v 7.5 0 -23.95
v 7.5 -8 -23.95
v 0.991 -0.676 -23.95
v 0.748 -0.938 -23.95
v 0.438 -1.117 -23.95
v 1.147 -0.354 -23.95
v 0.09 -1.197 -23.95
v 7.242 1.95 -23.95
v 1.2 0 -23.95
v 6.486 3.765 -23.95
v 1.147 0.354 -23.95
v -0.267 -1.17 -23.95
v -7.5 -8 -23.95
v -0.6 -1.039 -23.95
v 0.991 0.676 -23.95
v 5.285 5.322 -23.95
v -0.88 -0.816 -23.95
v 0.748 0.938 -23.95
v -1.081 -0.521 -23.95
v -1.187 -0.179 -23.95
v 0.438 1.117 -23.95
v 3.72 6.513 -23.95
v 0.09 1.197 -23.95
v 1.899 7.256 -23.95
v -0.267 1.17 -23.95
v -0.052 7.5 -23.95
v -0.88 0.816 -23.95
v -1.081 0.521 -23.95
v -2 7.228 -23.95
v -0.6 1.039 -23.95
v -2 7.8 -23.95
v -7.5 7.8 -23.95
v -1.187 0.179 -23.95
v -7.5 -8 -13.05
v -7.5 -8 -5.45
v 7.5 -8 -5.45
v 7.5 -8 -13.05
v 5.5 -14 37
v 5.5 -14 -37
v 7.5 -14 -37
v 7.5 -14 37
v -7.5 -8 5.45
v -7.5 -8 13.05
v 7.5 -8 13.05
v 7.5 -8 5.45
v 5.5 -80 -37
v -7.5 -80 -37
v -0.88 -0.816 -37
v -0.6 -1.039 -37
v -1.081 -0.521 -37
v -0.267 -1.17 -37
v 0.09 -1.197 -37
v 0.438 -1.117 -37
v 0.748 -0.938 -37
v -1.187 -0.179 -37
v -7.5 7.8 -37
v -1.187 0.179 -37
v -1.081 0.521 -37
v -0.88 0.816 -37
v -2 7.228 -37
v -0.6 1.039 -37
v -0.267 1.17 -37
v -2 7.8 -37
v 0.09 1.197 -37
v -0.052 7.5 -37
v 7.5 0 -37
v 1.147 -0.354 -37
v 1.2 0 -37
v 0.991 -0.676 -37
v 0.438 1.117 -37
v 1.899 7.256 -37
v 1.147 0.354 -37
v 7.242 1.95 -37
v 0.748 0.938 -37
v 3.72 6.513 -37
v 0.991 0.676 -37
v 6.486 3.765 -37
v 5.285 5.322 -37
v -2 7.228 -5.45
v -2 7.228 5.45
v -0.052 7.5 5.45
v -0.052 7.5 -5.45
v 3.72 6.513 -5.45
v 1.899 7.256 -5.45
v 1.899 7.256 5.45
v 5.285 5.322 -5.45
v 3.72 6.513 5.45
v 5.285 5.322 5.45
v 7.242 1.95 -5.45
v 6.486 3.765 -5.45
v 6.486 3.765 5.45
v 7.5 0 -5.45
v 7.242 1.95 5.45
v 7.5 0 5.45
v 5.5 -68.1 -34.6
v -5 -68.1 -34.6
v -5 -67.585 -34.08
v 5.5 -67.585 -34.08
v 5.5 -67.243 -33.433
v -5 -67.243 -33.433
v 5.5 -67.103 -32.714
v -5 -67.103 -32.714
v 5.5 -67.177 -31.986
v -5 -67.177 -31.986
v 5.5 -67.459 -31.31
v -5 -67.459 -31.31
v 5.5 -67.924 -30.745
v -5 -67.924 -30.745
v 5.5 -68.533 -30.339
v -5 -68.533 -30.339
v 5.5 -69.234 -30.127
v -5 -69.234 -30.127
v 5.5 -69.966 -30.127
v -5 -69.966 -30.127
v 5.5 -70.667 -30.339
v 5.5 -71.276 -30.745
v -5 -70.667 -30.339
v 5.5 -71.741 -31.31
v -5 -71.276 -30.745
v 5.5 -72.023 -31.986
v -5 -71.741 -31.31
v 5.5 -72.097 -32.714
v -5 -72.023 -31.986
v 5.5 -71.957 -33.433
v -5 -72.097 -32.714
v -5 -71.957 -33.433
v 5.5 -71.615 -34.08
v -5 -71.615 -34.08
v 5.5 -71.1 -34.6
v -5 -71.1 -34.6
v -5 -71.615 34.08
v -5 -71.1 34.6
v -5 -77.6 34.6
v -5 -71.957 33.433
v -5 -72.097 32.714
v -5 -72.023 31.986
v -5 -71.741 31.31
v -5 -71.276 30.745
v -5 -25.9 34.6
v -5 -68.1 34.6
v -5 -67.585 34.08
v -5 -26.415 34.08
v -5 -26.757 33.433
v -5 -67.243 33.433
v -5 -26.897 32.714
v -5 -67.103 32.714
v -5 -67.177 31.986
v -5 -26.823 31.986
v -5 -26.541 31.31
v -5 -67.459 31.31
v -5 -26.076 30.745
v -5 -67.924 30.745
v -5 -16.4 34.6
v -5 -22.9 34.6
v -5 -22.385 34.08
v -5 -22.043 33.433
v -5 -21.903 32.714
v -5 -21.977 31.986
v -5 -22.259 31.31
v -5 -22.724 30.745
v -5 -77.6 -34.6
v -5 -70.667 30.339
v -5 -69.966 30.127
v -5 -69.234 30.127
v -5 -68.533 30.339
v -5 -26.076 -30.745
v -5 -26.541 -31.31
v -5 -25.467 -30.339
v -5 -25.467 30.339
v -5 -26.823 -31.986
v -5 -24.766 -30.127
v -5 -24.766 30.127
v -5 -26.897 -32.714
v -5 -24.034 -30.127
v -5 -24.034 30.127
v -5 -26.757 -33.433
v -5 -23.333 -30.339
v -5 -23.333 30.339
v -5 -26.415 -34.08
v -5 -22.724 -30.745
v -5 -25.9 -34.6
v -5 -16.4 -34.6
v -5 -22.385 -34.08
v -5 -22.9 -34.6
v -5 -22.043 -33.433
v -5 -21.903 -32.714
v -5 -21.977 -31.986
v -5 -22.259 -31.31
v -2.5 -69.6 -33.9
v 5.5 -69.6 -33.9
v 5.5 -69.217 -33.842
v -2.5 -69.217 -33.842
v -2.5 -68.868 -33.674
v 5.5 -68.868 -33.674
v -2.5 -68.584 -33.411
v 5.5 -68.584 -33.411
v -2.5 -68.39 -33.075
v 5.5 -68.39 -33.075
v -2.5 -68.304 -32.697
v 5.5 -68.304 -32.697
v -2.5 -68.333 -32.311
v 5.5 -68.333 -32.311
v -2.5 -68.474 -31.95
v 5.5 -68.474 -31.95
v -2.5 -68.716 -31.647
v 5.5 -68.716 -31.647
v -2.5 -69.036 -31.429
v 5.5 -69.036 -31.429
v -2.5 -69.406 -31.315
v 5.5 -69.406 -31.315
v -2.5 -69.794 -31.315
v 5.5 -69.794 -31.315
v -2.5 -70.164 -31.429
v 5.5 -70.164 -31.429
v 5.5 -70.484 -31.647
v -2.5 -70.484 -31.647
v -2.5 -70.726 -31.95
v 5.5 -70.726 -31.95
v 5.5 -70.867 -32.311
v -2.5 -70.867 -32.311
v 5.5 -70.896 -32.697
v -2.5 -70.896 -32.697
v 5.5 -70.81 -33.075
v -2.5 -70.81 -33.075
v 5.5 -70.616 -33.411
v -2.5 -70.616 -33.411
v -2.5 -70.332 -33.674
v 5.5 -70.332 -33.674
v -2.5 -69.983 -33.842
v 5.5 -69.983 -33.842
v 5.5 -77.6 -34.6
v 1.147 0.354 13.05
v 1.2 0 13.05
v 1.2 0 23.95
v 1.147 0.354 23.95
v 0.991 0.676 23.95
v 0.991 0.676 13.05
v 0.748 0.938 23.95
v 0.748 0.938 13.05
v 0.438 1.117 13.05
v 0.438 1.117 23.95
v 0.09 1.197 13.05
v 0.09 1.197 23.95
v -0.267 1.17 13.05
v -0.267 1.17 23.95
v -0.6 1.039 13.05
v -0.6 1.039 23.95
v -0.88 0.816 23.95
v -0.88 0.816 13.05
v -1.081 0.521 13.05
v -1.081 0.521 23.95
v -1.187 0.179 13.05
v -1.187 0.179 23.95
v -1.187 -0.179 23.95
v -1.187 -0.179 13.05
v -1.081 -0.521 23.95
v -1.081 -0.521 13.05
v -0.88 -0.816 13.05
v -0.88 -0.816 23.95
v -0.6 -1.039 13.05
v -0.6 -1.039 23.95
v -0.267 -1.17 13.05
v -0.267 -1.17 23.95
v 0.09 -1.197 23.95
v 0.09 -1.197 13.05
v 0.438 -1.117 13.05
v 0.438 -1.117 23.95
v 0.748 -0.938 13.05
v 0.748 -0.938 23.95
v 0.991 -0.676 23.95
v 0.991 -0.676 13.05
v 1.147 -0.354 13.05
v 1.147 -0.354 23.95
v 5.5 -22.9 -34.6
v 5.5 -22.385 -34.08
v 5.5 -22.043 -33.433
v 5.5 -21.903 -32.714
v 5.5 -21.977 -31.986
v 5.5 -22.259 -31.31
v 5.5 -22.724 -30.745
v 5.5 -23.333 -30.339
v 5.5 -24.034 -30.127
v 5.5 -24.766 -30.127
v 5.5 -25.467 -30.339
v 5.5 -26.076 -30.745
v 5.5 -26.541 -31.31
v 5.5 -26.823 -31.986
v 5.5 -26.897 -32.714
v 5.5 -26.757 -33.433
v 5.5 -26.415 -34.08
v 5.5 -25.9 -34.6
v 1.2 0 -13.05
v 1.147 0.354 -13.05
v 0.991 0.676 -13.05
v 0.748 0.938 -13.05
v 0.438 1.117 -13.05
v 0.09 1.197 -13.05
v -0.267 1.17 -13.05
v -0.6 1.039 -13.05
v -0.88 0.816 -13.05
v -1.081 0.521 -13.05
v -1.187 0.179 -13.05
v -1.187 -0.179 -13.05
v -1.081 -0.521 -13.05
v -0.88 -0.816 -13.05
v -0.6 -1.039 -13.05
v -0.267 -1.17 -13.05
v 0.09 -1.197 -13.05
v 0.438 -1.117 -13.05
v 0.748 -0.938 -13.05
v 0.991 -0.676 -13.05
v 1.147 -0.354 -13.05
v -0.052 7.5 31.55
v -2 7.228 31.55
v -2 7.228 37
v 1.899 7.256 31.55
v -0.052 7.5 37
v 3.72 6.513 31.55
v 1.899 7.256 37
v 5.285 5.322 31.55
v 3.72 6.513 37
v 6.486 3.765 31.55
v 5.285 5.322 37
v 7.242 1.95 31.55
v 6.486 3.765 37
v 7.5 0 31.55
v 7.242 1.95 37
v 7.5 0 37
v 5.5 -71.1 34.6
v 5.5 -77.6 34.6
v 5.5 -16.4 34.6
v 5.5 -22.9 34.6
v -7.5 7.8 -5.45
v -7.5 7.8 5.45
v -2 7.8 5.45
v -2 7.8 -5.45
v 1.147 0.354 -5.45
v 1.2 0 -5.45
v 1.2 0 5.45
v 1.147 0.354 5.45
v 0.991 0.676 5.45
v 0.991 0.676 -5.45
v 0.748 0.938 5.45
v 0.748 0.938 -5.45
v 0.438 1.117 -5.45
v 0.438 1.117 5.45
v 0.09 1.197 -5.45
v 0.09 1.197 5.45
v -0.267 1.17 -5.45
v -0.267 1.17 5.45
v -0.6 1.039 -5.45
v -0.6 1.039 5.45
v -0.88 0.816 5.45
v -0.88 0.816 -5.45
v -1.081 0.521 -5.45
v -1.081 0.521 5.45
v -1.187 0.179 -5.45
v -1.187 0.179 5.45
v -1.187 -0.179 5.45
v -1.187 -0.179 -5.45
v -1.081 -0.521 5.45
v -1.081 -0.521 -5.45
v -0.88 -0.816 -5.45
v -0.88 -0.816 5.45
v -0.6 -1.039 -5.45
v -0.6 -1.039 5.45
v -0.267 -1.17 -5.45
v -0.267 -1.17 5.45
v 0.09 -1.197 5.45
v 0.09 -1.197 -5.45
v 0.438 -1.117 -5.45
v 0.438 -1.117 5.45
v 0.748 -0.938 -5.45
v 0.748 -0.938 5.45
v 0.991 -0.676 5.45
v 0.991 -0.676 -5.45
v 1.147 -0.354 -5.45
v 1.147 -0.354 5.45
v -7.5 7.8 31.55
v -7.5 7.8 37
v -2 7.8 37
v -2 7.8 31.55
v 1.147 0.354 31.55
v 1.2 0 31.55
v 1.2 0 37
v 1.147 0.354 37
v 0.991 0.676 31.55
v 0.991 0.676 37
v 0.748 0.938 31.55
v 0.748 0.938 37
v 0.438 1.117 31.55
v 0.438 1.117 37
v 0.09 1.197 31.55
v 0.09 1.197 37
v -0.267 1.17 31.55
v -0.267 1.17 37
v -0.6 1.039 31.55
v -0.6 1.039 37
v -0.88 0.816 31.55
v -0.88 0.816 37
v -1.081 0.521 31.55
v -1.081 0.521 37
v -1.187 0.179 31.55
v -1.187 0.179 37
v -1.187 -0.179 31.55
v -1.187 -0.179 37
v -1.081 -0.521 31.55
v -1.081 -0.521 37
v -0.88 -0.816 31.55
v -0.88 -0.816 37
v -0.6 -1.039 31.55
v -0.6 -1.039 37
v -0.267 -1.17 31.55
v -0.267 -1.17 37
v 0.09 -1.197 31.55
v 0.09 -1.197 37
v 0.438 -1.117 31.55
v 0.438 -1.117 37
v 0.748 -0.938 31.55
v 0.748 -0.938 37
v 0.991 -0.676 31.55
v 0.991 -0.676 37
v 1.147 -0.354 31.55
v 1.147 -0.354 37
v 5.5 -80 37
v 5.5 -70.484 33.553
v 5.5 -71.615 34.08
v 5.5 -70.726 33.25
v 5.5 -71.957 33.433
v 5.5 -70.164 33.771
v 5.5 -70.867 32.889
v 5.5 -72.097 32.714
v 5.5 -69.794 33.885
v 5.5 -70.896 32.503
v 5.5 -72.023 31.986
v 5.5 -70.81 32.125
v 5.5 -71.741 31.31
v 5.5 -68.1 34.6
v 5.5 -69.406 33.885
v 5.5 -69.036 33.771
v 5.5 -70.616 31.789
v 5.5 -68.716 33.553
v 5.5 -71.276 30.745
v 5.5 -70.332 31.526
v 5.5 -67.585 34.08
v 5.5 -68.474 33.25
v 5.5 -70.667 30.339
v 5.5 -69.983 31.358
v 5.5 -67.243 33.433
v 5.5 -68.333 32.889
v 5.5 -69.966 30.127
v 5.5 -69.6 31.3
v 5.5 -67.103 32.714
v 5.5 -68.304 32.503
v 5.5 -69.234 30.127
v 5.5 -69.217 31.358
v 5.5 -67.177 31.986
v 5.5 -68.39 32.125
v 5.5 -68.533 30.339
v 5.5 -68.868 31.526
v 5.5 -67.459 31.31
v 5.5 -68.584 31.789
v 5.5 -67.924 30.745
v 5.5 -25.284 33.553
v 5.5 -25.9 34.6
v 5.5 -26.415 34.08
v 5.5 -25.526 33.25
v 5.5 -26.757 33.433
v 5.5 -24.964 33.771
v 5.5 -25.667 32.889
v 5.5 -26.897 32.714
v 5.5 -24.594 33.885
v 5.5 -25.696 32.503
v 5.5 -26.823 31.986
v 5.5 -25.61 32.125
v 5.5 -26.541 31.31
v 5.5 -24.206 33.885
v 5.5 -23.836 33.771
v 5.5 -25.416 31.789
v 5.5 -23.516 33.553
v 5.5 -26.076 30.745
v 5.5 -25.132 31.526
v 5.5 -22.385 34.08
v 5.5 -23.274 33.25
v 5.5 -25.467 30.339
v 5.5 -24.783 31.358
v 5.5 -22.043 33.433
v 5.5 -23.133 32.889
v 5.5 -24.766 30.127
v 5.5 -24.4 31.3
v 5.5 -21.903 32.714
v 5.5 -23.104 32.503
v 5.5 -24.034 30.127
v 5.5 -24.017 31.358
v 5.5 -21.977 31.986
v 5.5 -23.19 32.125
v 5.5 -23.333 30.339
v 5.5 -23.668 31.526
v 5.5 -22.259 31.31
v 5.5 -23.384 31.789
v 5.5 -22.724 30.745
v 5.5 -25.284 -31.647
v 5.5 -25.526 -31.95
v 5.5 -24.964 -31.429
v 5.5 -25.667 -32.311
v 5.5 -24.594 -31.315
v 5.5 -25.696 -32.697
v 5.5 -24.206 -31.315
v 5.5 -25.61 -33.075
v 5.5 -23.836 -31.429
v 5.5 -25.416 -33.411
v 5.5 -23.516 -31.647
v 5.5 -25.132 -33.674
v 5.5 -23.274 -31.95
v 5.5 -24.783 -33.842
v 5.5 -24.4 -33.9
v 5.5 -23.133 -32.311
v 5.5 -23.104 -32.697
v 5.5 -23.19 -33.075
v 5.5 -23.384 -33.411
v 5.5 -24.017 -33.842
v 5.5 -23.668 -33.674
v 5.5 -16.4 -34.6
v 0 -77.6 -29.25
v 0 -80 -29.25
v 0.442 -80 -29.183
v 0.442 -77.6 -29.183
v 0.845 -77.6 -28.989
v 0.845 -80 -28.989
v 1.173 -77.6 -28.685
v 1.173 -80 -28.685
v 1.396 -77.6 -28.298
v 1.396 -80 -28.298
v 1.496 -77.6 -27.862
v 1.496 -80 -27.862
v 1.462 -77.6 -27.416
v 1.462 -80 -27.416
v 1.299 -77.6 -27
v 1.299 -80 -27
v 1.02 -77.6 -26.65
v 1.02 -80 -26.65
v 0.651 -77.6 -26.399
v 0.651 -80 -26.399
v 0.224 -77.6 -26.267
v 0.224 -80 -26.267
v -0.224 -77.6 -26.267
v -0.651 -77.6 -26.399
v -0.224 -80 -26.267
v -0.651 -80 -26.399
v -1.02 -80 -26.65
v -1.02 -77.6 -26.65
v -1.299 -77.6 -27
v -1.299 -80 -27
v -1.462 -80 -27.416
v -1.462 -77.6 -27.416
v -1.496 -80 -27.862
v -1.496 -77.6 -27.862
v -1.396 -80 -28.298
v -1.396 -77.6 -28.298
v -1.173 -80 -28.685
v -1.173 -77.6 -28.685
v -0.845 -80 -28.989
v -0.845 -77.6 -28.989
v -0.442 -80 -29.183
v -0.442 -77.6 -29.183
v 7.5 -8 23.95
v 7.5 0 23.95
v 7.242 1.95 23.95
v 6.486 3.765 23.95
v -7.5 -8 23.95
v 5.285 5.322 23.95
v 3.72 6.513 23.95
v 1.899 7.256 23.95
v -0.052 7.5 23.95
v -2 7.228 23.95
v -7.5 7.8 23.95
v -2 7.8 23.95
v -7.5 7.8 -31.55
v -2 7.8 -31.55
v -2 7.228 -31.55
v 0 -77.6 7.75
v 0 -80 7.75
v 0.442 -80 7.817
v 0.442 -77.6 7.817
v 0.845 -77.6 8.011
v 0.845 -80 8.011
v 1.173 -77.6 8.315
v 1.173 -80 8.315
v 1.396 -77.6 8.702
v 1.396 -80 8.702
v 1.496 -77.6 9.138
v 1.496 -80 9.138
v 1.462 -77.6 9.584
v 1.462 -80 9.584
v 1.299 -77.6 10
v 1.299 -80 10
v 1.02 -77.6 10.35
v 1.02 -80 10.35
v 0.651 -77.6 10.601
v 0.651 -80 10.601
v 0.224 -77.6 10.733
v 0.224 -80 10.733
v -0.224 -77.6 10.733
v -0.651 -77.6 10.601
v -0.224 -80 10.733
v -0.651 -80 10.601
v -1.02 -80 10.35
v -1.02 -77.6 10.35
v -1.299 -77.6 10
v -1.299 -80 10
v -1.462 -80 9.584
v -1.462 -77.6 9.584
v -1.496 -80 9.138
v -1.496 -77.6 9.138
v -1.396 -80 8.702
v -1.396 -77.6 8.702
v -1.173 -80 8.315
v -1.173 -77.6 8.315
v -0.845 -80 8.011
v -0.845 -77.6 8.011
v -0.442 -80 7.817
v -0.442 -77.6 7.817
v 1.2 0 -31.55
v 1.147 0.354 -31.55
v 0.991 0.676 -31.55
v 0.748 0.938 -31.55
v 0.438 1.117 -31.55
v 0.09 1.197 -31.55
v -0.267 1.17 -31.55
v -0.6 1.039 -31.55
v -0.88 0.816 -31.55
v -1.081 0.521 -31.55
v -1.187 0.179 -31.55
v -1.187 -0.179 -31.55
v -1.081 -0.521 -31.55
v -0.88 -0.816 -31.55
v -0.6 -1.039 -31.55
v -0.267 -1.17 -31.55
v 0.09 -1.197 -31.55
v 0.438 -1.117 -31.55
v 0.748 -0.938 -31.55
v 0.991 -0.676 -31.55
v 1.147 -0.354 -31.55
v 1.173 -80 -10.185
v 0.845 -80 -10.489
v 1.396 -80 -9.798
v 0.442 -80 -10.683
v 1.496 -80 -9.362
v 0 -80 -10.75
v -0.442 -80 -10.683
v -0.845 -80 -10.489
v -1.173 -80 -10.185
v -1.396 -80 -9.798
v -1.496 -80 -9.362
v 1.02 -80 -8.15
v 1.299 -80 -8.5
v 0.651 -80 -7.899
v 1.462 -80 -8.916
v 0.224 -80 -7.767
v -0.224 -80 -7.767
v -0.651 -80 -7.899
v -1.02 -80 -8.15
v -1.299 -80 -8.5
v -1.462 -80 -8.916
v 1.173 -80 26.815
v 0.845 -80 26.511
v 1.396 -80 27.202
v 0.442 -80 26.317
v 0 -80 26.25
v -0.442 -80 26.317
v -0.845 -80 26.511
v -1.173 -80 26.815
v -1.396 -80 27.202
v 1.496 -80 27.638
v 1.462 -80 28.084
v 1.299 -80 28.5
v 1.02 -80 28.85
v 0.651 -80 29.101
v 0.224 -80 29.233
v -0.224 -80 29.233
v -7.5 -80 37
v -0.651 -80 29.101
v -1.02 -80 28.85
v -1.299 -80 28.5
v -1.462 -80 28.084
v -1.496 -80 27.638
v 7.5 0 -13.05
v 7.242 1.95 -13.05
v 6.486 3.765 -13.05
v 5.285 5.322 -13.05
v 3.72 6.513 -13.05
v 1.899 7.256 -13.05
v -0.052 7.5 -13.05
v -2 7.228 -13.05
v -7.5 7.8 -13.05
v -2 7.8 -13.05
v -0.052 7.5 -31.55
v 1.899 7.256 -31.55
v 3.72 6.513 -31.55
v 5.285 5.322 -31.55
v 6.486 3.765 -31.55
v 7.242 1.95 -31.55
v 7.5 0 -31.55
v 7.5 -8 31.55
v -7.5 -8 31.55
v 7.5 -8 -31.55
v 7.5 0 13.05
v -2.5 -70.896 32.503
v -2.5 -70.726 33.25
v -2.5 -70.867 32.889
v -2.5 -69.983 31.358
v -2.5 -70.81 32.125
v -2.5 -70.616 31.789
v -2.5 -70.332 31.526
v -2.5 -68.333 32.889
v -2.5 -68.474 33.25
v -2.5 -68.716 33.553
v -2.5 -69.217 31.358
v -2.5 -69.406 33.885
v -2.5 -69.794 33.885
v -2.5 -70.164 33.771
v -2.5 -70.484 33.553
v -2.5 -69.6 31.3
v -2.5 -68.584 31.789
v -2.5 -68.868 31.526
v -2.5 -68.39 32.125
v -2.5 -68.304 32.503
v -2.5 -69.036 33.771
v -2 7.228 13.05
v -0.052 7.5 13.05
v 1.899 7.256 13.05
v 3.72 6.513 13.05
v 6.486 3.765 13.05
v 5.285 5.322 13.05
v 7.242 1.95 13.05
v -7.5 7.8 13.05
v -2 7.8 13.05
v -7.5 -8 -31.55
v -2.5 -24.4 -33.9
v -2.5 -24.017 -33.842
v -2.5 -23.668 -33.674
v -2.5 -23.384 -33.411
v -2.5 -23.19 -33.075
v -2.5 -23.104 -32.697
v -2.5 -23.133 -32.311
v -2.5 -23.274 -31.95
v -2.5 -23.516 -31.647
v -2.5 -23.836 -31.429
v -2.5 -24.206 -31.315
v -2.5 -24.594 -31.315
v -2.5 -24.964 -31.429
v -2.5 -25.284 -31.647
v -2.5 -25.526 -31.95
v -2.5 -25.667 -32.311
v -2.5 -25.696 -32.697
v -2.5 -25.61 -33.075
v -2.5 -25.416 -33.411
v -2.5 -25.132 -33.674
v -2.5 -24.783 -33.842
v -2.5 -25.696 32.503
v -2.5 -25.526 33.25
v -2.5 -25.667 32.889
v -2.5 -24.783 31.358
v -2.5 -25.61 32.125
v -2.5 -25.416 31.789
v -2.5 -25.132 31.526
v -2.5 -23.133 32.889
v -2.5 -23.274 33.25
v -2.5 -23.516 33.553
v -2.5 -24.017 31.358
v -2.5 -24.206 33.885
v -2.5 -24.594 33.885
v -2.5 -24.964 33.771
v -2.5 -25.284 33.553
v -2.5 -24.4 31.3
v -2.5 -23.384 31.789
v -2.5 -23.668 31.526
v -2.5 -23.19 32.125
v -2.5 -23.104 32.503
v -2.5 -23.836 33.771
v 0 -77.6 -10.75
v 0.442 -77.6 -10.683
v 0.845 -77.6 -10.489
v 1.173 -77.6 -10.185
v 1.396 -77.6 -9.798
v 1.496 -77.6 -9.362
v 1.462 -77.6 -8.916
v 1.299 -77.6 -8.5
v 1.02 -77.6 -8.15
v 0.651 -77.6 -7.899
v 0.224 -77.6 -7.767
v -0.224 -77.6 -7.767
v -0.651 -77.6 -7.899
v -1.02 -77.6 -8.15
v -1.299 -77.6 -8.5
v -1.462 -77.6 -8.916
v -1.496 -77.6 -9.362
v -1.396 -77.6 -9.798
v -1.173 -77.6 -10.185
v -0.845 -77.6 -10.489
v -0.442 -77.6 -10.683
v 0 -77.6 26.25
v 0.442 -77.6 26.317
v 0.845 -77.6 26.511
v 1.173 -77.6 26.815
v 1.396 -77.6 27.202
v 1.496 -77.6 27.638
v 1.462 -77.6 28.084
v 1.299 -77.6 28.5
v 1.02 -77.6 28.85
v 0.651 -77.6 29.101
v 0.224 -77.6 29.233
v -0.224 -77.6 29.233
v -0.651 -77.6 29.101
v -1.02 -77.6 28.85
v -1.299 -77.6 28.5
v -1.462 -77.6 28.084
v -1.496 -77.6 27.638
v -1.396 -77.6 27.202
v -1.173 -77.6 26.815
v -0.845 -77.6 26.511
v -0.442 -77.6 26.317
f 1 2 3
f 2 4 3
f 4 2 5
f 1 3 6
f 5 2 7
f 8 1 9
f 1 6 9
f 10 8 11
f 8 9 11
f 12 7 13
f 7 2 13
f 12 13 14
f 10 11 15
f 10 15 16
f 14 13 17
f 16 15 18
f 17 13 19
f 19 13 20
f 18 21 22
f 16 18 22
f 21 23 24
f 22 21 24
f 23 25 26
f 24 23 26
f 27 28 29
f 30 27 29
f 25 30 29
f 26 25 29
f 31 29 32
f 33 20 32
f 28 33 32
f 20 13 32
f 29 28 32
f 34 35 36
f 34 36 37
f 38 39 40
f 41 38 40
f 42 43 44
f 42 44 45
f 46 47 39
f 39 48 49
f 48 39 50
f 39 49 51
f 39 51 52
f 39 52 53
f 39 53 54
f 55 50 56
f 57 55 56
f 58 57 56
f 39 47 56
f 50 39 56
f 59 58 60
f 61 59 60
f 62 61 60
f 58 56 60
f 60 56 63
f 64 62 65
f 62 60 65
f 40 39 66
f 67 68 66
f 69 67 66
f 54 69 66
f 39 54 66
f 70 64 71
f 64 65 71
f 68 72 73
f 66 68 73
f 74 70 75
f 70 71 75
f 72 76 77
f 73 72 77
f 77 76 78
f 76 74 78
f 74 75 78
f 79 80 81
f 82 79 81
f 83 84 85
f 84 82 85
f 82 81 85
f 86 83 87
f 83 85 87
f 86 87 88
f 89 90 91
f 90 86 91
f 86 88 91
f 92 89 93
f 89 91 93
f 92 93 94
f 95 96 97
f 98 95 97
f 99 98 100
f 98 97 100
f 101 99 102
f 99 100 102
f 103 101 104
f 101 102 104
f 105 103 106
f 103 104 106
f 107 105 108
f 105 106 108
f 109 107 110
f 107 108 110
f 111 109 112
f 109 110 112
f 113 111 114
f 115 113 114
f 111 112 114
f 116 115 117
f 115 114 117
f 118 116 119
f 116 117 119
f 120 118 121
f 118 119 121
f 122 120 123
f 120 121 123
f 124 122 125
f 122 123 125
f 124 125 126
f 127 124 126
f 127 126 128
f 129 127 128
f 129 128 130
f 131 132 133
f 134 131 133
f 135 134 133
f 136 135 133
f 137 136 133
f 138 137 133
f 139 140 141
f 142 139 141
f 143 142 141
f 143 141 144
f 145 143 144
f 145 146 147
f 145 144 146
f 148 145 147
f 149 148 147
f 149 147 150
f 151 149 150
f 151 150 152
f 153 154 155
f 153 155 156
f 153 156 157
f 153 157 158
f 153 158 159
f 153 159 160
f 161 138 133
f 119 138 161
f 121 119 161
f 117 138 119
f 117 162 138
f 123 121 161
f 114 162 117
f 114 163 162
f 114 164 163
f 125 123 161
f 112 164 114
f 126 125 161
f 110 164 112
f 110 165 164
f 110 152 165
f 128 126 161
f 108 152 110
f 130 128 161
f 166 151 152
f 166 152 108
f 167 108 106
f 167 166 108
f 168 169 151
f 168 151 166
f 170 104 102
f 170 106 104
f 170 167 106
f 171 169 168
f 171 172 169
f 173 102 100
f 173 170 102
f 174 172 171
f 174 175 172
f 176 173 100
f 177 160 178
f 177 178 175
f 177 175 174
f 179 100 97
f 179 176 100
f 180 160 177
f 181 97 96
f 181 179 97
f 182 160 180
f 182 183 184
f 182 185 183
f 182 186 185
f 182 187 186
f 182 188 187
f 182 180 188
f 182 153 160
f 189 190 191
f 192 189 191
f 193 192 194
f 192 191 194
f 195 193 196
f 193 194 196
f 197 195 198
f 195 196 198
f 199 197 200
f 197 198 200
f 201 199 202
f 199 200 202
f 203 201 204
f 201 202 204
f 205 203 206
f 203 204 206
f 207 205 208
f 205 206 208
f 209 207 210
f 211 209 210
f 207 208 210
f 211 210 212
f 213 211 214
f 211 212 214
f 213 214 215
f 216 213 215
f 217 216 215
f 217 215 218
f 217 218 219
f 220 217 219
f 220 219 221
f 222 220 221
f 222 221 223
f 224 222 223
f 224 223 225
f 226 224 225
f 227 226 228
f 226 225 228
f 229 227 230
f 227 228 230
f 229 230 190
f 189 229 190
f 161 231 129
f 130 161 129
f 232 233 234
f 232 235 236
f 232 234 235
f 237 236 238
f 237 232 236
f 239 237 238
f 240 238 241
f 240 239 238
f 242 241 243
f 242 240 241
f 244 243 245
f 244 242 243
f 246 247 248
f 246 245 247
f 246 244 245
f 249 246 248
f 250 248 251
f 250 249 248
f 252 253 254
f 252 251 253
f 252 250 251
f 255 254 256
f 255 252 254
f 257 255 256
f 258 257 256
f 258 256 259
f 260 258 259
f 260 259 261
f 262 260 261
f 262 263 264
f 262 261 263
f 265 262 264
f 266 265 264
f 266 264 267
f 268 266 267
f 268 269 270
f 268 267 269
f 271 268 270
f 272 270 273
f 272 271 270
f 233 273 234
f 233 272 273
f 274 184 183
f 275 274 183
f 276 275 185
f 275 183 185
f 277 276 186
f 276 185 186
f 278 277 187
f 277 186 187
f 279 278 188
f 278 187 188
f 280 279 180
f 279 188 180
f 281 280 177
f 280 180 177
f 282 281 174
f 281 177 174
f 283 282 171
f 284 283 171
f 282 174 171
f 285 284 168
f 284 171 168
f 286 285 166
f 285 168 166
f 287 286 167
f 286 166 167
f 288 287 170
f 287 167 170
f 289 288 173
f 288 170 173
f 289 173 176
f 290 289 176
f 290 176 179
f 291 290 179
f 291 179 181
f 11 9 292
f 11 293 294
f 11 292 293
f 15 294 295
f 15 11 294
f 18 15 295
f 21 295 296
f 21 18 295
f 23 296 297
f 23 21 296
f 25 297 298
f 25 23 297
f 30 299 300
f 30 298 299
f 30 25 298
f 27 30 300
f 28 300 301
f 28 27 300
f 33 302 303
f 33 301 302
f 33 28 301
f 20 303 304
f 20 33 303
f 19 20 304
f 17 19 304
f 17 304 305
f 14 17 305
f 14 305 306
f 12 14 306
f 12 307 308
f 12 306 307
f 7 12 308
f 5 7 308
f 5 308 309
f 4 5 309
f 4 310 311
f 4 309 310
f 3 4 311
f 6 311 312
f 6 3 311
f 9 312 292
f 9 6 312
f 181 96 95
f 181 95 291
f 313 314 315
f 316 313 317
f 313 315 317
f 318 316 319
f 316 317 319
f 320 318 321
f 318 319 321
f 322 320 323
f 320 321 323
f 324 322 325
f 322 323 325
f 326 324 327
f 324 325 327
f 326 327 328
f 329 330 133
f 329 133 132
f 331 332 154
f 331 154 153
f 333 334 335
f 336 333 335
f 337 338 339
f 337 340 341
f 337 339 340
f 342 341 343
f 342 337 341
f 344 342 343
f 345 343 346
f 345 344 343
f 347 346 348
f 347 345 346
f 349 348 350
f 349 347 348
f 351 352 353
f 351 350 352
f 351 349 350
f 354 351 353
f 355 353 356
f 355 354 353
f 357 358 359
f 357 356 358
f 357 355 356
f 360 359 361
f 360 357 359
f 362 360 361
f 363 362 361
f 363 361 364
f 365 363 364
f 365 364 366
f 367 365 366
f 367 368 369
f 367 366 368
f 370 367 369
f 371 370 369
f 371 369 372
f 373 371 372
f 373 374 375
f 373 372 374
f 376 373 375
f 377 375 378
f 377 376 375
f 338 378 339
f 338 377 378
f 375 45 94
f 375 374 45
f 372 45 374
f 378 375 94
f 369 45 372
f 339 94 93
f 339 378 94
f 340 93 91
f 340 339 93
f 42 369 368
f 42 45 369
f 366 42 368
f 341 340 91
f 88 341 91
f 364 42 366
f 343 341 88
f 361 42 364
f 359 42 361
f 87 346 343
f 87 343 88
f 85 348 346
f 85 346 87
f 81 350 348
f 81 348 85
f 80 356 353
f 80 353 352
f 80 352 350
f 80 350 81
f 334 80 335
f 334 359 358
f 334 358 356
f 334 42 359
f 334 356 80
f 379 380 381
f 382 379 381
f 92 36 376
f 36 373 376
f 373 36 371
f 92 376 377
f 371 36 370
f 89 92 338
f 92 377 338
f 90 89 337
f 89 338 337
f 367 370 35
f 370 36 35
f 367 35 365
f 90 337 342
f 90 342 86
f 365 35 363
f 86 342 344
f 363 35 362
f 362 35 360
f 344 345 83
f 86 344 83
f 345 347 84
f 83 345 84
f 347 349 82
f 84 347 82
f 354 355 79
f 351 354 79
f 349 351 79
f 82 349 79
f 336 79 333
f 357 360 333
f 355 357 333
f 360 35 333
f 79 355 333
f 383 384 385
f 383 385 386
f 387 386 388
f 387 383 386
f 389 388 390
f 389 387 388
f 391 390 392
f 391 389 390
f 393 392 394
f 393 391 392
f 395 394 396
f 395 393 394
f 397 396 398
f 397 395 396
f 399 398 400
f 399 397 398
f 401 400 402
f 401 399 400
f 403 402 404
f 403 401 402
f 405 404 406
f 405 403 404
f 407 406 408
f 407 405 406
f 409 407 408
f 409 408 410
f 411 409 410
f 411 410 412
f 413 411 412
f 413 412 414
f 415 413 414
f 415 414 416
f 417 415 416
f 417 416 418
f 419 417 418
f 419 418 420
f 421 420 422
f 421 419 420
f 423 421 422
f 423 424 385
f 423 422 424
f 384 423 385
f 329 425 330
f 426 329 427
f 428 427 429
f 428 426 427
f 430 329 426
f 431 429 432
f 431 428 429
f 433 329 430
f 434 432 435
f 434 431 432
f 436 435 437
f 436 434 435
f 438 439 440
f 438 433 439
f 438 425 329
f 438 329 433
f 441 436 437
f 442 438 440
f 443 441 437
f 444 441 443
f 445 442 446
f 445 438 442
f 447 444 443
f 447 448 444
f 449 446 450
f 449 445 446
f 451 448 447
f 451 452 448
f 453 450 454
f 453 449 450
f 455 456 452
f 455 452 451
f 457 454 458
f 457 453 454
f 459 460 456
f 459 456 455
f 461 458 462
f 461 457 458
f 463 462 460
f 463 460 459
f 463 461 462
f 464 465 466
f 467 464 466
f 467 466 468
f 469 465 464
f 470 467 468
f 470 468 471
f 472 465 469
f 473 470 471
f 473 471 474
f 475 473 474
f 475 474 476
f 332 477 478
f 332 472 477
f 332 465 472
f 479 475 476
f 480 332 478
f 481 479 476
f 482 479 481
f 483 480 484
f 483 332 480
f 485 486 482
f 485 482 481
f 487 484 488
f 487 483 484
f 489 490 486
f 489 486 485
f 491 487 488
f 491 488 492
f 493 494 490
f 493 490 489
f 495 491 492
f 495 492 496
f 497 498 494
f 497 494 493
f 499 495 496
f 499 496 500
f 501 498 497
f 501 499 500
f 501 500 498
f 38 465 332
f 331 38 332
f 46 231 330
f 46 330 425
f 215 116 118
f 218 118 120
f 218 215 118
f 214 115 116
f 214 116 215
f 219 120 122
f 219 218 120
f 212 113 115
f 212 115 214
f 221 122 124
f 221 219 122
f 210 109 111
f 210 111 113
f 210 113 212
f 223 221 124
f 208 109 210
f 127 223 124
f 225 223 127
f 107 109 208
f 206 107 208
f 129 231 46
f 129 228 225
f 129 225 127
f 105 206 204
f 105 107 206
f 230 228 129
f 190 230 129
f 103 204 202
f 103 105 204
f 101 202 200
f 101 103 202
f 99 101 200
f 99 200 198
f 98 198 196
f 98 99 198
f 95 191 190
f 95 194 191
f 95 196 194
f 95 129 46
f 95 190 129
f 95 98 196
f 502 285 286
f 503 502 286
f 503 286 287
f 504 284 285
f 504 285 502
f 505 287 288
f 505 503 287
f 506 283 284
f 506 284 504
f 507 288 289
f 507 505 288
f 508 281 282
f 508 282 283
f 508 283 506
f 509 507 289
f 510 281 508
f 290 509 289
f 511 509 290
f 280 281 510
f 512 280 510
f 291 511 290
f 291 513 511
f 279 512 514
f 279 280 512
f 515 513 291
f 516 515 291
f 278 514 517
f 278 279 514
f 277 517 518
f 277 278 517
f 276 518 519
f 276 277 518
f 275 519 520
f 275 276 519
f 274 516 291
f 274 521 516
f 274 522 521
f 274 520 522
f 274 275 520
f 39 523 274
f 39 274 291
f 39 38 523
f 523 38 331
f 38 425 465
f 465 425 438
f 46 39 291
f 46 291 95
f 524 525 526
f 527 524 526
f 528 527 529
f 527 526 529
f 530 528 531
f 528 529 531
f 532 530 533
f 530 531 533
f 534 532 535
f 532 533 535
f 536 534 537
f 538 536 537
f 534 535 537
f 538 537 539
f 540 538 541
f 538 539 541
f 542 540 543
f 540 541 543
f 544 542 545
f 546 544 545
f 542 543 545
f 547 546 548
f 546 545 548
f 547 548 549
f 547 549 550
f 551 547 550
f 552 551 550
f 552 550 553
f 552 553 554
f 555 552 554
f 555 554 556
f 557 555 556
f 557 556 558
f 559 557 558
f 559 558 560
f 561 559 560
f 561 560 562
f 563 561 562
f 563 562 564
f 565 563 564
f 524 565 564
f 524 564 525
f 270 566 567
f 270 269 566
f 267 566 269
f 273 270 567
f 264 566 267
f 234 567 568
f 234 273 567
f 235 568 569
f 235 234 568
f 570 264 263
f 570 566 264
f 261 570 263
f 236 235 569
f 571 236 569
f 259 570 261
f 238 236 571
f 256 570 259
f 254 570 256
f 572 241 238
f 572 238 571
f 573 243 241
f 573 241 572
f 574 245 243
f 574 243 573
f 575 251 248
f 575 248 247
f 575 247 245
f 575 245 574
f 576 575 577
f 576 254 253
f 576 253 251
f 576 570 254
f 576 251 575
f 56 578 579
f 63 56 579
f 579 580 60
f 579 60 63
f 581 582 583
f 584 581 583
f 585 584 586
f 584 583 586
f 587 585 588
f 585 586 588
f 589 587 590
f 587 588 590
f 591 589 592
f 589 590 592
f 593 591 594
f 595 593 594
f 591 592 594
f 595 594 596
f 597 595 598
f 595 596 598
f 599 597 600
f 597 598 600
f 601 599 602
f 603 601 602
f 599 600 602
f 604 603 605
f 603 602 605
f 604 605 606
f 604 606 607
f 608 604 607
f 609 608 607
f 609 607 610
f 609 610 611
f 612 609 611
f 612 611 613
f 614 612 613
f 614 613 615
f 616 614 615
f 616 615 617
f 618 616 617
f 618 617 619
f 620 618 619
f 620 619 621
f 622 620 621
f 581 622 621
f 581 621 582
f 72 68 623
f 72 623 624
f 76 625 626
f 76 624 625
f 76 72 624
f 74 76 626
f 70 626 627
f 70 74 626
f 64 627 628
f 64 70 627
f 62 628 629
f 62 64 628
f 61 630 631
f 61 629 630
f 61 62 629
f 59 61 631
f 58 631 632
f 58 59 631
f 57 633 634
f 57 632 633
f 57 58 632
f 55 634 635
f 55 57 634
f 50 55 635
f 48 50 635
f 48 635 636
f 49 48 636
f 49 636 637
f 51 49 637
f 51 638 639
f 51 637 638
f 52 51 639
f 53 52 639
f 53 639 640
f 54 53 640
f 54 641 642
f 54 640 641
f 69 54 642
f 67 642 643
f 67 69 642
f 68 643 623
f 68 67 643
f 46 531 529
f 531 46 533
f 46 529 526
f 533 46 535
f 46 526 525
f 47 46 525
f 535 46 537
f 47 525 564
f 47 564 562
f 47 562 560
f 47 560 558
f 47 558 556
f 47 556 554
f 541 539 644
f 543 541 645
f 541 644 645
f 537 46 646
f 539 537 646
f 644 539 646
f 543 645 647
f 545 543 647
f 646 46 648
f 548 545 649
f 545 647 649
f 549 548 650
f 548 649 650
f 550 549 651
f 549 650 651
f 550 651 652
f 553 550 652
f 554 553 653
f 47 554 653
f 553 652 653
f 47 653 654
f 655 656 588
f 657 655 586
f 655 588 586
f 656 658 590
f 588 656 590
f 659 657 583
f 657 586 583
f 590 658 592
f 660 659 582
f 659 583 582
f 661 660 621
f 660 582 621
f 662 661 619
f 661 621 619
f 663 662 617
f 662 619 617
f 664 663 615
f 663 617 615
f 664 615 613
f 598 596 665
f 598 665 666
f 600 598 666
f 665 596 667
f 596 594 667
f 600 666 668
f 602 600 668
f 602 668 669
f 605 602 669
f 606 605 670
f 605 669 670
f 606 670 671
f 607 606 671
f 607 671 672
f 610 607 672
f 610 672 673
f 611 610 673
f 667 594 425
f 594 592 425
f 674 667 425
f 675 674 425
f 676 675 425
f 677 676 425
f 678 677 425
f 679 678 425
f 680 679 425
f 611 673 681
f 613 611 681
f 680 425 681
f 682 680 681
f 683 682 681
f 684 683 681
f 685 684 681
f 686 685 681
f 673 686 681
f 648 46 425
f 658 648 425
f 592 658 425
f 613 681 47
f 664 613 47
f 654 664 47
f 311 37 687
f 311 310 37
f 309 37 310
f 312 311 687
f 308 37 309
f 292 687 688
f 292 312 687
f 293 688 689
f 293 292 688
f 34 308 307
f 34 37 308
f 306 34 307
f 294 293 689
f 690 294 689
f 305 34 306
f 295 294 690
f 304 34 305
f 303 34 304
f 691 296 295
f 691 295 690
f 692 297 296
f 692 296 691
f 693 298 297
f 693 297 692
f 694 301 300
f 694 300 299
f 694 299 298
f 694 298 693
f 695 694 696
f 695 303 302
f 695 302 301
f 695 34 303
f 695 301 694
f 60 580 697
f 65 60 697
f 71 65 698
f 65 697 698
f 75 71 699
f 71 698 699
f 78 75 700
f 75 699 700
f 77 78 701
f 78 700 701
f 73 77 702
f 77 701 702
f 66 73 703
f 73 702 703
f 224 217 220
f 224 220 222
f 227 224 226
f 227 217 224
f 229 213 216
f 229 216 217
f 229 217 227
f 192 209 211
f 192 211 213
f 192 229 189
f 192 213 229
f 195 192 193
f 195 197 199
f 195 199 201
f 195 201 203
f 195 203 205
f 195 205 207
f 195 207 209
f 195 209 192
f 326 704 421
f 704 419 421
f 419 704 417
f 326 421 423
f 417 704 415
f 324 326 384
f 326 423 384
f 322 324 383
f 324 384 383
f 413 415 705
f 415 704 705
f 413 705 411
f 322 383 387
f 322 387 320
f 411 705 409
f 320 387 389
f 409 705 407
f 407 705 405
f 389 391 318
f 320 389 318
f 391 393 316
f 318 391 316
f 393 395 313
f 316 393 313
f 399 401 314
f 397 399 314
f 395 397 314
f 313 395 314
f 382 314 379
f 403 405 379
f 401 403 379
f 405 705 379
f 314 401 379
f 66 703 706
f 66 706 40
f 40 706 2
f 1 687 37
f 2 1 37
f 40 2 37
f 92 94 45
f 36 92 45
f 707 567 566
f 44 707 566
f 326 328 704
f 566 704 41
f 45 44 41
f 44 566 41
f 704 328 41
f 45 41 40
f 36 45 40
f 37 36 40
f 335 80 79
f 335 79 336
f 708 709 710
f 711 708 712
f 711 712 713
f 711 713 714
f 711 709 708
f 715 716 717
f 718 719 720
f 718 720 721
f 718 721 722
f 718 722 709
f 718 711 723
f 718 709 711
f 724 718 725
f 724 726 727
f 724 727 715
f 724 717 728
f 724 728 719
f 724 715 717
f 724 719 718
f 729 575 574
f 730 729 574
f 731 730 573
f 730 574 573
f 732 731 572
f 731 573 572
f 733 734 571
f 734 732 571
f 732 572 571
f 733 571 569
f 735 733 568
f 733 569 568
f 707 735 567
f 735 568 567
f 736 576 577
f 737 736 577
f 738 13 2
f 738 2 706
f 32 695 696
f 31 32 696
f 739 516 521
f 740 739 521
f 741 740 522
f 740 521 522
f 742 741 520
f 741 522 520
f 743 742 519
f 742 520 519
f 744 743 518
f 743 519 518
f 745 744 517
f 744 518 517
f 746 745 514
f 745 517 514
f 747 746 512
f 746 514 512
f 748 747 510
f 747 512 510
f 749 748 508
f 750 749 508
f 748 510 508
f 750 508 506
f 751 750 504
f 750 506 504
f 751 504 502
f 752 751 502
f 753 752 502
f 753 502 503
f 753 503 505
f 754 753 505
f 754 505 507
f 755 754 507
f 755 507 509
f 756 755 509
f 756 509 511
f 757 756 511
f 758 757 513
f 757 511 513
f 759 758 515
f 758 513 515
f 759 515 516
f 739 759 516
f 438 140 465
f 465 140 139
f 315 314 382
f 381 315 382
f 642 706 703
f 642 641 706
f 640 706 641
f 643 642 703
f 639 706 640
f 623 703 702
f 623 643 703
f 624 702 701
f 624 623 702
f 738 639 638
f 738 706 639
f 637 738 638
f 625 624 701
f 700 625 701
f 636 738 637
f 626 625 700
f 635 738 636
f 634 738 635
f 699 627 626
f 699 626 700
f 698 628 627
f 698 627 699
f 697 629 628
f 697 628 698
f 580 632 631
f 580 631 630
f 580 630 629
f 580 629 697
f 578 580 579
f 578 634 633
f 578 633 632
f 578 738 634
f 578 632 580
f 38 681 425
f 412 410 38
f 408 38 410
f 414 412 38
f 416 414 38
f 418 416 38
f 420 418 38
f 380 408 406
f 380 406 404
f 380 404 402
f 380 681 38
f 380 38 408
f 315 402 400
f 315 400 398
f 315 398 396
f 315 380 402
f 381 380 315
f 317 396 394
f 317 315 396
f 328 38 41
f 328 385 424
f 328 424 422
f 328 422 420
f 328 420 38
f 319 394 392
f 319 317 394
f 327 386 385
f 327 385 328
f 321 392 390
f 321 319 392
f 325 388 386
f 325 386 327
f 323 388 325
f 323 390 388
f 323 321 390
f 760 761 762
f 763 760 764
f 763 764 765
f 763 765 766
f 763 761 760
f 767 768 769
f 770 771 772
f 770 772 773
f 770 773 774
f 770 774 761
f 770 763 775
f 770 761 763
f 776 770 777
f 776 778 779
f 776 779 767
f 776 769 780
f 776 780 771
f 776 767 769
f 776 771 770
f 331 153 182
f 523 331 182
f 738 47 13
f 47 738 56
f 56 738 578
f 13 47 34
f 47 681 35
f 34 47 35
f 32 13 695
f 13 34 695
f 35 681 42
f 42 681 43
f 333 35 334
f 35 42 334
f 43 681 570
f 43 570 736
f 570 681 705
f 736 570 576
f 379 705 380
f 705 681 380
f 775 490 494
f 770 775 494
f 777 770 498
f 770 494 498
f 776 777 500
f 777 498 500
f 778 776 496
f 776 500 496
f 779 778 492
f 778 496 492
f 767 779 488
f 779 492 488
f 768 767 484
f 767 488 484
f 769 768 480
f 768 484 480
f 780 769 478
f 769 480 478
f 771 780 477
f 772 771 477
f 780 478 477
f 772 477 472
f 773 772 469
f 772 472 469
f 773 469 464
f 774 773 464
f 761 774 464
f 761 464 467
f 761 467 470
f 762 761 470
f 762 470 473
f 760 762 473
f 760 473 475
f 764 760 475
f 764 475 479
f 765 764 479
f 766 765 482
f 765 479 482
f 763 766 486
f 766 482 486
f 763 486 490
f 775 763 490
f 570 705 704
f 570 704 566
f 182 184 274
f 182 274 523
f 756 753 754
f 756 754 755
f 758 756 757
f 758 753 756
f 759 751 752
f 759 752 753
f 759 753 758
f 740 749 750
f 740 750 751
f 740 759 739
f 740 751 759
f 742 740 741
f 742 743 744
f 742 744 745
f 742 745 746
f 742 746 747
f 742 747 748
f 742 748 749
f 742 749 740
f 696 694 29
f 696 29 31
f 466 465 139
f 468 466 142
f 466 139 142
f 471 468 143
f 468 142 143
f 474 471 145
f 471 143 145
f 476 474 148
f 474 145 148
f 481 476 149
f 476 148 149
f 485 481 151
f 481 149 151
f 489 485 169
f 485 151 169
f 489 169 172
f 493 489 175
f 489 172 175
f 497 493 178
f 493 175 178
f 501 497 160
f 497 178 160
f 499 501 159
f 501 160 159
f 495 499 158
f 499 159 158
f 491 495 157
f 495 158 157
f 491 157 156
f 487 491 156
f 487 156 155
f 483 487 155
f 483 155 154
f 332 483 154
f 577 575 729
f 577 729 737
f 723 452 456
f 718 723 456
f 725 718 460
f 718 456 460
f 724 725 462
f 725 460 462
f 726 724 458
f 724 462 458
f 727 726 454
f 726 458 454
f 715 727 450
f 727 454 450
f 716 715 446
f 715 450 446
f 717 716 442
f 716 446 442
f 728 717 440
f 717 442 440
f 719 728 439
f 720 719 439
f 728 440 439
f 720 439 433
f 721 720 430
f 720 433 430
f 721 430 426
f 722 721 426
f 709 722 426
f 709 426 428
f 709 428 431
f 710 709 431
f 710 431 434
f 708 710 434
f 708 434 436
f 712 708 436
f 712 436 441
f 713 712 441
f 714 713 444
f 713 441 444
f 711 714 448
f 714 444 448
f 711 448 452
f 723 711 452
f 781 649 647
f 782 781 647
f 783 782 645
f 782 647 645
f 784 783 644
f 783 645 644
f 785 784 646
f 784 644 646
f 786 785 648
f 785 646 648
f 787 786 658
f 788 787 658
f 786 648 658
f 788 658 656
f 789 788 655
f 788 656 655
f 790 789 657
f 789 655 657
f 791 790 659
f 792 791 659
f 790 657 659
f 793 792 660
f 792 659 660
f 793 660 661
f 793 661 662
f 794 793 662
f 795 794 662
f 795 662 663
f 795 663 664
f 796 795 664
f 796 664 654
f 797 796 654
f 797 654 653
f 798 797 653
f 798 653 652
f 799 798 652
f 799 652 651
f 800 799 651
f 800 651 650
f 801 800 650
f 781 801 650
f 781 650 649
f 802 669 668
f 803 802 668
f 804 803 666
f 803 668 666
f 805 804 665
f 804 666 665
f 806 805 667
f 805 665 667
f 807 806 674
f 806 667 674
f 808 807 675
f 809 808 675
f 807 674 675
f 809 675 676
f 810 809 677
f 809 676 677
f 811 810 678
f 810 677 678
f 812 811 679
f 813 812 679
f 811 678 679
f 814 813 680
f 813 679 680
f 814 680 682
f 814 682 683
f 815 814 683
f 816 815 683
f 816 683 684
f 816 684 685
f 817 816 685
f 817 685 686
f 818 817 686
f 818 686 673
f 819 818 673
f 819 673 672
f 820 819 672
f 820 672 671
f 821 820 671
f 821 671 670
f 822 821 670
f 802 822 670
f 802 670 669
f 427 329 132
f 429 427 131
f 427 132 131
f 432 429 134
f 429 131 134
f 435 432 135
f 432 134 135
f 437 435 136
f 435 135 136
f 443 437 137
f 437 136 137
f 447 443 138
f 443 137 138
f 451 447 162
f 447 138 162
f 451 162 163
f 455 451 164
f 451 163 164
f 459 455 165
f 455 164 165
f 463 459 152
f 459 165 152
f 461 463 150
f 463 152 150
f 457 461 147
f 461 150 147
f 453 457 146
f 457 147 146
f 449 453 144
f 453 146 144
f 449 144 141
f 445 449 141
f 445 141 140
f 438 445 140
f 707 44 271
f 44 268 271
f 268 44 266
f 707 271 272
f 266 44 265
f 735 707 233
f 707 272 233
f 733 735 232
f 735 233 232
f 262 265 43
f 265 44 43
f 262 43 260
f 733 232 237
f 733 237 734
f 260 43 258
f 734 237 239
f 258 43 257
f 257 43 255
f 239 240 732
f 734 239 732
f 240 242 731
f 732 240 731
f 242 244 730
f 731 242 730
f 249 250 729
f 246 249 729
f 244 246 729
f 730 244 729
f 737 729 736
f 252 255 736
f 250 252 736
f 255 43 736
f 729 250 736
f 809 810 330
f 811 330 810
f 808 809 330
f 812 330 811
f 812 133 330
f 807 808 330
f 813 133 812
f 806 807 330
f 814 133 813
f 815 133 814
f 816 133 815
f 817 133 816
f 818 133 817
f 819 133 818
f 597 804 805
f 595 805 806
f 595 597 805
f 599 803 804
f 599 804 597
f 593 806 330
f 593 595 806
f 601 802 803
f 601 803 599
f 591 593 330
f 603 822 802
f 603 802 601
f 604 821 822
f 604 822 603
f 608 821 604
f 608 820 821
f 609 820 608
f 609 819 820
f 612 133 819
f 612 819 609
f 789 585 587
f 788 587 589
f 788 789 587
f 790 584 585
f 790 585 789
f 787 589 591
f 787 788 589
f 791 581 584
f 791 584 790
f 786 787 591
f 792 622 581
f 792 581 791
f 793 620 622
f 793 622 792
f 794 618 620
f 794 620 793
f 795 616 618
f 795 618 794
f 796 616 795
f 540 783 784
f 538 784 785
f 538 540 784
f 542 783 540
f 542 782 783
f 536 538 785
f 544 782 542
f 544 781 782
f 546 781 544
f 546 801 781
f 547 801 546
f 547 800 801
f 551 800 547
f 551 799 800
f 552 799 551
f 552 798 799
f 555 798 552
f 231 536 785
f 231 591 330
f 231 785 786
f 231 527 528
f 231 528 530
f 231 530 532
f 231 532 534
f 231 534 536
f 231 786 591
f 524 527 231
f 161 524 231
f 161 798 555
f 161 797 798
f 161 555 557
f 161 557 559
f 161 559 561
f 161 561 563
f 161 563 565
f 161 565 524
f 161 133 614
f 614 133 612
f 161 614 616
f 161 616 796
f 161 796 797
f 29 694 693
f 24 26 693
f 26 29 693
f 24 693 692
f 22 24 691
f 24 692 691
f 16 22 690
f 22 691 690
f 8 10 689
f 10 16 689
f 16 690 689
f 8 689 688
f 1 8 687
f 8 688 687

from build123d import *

# Parameters (mm, degrees)
BOSS_EXTRUDE1_DEPTH     = 37
SKETCH2_W               = 5.5
SKETCH2_H               = 7.8
BOSS_EXTRUDE2_DEPTH     = 37
CUT_EXTRUDE1_DEPTH      = 89.460443137
CUT_EXTRUDE1_DEPTH_BACK = 89.460443137
SKETCH3_W               = 7.6
SKETCH3_H               = 17
CUT_EXTRUDE2_DEPTH      = 89.460443137
CUT_EXTRUDE2_DEPTH_BACK = 89.460443137
SKETCH4_R               = 1.2
CUT_EXTRUDE3_DEPTH      = 89.460443137
CUT_EXTRUDE3_DEPTH_BACK = 89.460443137
SKETCH5_W               = 2.5
SKETCH5_H               = 67
CUT_EXTRUDE4_DEPTH      = 90.09545443
CUT_EXTRUDE4_DEPTH_BACK = 10.5
SKETCH6_W               = 69.2
SKETCH6_H               = 61.2
SKETCH7_R               = 2.5
BOSS_EXTRUDE8_DEPTH     = 10.5
SKETCH8_R               = 1.3
CUT_EXTRUDE5_DEPTH      = 8
SKETCH9_R               = 1.5
CUT_EXTRUDE6_DEPTH      = 3


with BuildPart() as part:
    # Sketch1 → Boss-Extrude1 (new, symmetric)
    with BuildSketch(Plane.XY):
        with BuildLine():
            Line((7.5, 0), (7.5, -80))
            Line((7.5, -80), (-7.5, -80))
            Line((-7.5, -80), (-7.5, 0))
            ThreePointArc((-7.5, 0), (0, 7.5), (7.5, 0))
        make_face()
    extrude(amount=BOSS_EXTRUDE1_DEPTH, both=True)

    # Sketch2 → Boss-Extrude2 (add, symmetric)
    with BuildSketch(Plane.XY):
        with Locations((-4.75, 3.9)):
            Rectangle(SKETCH2_W, SKETCH2_H)
    extrude(amount=BOSS_EXTRUDE2_DEPTH, both=True)

    # Sketch3 → Cut-Extrude1 (cut, two sides: drawn at the far end of the back side and taken through both)
    with BuildSketch(Plane(origin=(0, 0, 0), x_dir=(0, 0, -1), z_dir=(1, 0, 0)).offset(-CUT_EXTRUDE1_DEPTH_BACK)):
        with Locations((-9.25, 0.5)):
            Rectangle(SKETCH3_W, SKETCH3_H)
        with Locations((-27.75, 0.5)):
            Rectangle(SKETCH3_W, SKETCH3_H)
        with Locations((27.75, 0.5)):
            Rectangle(SKETCH3_W, SKETCH3_H)
        with Locations((9.25, 0.5)):
            Rectangle(SKETCH3_W, SKETCH3_H)
    extrude(amount=CUT_EXTRUDE1_DEPTH + CUT_EXTRUDE1_DEPTH_BACK, mode=Mode.SUBTRACT)

    # Sketch4 → Cut-Extrude2 (cut, two sides: drawn at the far end of the back side and taken through both)
    with BuildSketch(Plane.XY.offset(-CUT_EXTRUDE2_DEPTH_BACK)):
        Circle(SKETCH4_R)
    extrude(amount=CUT_EXTRUDE2_DEPTH + CUT_EXTRUDE2_DEPTH_BACK, mode=Mode.SUBTRACT)

    # Sketch5 → Cut-Extrude3 (cut, two sides: drawn at the far end of the back side and taken through both)
    with BuildSketch(Plane.XY.offset(-CUT_EXTRUDE3_DEPTH_BACK)):
        with Locations((6.75, -47.5)):
            Rectangle(SKETCH5_W, SKETCH5_H)
    extrude(amount=CUT_EXTRUDE3_DEPTH + CUT_EXTRUDE3_DEPTH_BACK, mode=Mode.SUBTRACT)

    # Sketch6 → Cut-Extrude4 (cut, two sides: drawn at the far end of the back side and taken through both)
    with BuildSketch(Plane(origin=(5.5, 0, 0), x_dir=(0, 0, -1), z_dir=(1, 0, 0)).offset(-CUT_EXTRUDE4_DEPTH_BACK)):
        with Locations((0, -47)):
            Rectangle(SKETCH6_W, SKETCH6_H)
    extrude(amount=CUT_EXTRUDE4_DEPTH + CUT_EXTRUDE4_DEPTH_BACK, mode=Mode.SUBTRACT)

    # Sketch7 → Boss-Extrude8 (add)
    with BuildSketch(Plane(origin=(-5, 0, 0), x_dir=(0, 0, -1), z_dir=(1, 0, 0))):
        with Locations((-32.6, -69.6)):
            Circle(SKETCH7_R)
        with Locations((-32.6, -24.4)):
            Circle(SKETCH7_R)
        with Locations((32.6, -24.4)):
            Circle(SKETCH7_R)
        with Locations((32.6, -69.6)):
            Circle(SKETCH7_R)
    extrude(amount=BOSS_EXTRUDE8_DEPTH)

    # Sketch8 → Cut-Extrude5 (cut)
    with BuildSketch(Plane(origin=(5.5, 0, 0), x_dir=(0, 0, -1), z_dir=(1, 0, 0))):
        with Locations((-32.6, -24.4)):
            Circle(SKETCH8_R)
        with Locations((32.6, -24.4)):
            Circle(SKETCH8_R)
        with Locations((32.6, -69.6)):
            Circle(SKETCH8_R)
        with Locations((-32.6, -69.6)):
            Circle(SKETCH8_R)
    extrude(amount=-CUT_EXTRUDE5_DEPTH, mode=Mode.SUBTRACT)

    # Sketch9 → Cut-Extrude6 (cut)
    with BuildSketch(Plane.XZ.offset(80)):
        with Locations(Location((0, -9.25, 0), (0, 0, 270))):
            Circle(SKETCH9_R)
        with Locations(Location((0, -27.75, 0), (0, 0, 270))):
            Circle(SKETCH9_R)
        with Locations(Location((0, 9.25, 0), (0, 0, 270))):
            Circle(SKETCH9_R)
        with Locations(Location((0, 27.75, 0), (0, 0, 270))):
            Circle(SKETCH9_R)
    extrude(amount=-CUT_EXTRUDE6_DEPTH, mode=Mode.SUBTRACT)


solid = part.part
